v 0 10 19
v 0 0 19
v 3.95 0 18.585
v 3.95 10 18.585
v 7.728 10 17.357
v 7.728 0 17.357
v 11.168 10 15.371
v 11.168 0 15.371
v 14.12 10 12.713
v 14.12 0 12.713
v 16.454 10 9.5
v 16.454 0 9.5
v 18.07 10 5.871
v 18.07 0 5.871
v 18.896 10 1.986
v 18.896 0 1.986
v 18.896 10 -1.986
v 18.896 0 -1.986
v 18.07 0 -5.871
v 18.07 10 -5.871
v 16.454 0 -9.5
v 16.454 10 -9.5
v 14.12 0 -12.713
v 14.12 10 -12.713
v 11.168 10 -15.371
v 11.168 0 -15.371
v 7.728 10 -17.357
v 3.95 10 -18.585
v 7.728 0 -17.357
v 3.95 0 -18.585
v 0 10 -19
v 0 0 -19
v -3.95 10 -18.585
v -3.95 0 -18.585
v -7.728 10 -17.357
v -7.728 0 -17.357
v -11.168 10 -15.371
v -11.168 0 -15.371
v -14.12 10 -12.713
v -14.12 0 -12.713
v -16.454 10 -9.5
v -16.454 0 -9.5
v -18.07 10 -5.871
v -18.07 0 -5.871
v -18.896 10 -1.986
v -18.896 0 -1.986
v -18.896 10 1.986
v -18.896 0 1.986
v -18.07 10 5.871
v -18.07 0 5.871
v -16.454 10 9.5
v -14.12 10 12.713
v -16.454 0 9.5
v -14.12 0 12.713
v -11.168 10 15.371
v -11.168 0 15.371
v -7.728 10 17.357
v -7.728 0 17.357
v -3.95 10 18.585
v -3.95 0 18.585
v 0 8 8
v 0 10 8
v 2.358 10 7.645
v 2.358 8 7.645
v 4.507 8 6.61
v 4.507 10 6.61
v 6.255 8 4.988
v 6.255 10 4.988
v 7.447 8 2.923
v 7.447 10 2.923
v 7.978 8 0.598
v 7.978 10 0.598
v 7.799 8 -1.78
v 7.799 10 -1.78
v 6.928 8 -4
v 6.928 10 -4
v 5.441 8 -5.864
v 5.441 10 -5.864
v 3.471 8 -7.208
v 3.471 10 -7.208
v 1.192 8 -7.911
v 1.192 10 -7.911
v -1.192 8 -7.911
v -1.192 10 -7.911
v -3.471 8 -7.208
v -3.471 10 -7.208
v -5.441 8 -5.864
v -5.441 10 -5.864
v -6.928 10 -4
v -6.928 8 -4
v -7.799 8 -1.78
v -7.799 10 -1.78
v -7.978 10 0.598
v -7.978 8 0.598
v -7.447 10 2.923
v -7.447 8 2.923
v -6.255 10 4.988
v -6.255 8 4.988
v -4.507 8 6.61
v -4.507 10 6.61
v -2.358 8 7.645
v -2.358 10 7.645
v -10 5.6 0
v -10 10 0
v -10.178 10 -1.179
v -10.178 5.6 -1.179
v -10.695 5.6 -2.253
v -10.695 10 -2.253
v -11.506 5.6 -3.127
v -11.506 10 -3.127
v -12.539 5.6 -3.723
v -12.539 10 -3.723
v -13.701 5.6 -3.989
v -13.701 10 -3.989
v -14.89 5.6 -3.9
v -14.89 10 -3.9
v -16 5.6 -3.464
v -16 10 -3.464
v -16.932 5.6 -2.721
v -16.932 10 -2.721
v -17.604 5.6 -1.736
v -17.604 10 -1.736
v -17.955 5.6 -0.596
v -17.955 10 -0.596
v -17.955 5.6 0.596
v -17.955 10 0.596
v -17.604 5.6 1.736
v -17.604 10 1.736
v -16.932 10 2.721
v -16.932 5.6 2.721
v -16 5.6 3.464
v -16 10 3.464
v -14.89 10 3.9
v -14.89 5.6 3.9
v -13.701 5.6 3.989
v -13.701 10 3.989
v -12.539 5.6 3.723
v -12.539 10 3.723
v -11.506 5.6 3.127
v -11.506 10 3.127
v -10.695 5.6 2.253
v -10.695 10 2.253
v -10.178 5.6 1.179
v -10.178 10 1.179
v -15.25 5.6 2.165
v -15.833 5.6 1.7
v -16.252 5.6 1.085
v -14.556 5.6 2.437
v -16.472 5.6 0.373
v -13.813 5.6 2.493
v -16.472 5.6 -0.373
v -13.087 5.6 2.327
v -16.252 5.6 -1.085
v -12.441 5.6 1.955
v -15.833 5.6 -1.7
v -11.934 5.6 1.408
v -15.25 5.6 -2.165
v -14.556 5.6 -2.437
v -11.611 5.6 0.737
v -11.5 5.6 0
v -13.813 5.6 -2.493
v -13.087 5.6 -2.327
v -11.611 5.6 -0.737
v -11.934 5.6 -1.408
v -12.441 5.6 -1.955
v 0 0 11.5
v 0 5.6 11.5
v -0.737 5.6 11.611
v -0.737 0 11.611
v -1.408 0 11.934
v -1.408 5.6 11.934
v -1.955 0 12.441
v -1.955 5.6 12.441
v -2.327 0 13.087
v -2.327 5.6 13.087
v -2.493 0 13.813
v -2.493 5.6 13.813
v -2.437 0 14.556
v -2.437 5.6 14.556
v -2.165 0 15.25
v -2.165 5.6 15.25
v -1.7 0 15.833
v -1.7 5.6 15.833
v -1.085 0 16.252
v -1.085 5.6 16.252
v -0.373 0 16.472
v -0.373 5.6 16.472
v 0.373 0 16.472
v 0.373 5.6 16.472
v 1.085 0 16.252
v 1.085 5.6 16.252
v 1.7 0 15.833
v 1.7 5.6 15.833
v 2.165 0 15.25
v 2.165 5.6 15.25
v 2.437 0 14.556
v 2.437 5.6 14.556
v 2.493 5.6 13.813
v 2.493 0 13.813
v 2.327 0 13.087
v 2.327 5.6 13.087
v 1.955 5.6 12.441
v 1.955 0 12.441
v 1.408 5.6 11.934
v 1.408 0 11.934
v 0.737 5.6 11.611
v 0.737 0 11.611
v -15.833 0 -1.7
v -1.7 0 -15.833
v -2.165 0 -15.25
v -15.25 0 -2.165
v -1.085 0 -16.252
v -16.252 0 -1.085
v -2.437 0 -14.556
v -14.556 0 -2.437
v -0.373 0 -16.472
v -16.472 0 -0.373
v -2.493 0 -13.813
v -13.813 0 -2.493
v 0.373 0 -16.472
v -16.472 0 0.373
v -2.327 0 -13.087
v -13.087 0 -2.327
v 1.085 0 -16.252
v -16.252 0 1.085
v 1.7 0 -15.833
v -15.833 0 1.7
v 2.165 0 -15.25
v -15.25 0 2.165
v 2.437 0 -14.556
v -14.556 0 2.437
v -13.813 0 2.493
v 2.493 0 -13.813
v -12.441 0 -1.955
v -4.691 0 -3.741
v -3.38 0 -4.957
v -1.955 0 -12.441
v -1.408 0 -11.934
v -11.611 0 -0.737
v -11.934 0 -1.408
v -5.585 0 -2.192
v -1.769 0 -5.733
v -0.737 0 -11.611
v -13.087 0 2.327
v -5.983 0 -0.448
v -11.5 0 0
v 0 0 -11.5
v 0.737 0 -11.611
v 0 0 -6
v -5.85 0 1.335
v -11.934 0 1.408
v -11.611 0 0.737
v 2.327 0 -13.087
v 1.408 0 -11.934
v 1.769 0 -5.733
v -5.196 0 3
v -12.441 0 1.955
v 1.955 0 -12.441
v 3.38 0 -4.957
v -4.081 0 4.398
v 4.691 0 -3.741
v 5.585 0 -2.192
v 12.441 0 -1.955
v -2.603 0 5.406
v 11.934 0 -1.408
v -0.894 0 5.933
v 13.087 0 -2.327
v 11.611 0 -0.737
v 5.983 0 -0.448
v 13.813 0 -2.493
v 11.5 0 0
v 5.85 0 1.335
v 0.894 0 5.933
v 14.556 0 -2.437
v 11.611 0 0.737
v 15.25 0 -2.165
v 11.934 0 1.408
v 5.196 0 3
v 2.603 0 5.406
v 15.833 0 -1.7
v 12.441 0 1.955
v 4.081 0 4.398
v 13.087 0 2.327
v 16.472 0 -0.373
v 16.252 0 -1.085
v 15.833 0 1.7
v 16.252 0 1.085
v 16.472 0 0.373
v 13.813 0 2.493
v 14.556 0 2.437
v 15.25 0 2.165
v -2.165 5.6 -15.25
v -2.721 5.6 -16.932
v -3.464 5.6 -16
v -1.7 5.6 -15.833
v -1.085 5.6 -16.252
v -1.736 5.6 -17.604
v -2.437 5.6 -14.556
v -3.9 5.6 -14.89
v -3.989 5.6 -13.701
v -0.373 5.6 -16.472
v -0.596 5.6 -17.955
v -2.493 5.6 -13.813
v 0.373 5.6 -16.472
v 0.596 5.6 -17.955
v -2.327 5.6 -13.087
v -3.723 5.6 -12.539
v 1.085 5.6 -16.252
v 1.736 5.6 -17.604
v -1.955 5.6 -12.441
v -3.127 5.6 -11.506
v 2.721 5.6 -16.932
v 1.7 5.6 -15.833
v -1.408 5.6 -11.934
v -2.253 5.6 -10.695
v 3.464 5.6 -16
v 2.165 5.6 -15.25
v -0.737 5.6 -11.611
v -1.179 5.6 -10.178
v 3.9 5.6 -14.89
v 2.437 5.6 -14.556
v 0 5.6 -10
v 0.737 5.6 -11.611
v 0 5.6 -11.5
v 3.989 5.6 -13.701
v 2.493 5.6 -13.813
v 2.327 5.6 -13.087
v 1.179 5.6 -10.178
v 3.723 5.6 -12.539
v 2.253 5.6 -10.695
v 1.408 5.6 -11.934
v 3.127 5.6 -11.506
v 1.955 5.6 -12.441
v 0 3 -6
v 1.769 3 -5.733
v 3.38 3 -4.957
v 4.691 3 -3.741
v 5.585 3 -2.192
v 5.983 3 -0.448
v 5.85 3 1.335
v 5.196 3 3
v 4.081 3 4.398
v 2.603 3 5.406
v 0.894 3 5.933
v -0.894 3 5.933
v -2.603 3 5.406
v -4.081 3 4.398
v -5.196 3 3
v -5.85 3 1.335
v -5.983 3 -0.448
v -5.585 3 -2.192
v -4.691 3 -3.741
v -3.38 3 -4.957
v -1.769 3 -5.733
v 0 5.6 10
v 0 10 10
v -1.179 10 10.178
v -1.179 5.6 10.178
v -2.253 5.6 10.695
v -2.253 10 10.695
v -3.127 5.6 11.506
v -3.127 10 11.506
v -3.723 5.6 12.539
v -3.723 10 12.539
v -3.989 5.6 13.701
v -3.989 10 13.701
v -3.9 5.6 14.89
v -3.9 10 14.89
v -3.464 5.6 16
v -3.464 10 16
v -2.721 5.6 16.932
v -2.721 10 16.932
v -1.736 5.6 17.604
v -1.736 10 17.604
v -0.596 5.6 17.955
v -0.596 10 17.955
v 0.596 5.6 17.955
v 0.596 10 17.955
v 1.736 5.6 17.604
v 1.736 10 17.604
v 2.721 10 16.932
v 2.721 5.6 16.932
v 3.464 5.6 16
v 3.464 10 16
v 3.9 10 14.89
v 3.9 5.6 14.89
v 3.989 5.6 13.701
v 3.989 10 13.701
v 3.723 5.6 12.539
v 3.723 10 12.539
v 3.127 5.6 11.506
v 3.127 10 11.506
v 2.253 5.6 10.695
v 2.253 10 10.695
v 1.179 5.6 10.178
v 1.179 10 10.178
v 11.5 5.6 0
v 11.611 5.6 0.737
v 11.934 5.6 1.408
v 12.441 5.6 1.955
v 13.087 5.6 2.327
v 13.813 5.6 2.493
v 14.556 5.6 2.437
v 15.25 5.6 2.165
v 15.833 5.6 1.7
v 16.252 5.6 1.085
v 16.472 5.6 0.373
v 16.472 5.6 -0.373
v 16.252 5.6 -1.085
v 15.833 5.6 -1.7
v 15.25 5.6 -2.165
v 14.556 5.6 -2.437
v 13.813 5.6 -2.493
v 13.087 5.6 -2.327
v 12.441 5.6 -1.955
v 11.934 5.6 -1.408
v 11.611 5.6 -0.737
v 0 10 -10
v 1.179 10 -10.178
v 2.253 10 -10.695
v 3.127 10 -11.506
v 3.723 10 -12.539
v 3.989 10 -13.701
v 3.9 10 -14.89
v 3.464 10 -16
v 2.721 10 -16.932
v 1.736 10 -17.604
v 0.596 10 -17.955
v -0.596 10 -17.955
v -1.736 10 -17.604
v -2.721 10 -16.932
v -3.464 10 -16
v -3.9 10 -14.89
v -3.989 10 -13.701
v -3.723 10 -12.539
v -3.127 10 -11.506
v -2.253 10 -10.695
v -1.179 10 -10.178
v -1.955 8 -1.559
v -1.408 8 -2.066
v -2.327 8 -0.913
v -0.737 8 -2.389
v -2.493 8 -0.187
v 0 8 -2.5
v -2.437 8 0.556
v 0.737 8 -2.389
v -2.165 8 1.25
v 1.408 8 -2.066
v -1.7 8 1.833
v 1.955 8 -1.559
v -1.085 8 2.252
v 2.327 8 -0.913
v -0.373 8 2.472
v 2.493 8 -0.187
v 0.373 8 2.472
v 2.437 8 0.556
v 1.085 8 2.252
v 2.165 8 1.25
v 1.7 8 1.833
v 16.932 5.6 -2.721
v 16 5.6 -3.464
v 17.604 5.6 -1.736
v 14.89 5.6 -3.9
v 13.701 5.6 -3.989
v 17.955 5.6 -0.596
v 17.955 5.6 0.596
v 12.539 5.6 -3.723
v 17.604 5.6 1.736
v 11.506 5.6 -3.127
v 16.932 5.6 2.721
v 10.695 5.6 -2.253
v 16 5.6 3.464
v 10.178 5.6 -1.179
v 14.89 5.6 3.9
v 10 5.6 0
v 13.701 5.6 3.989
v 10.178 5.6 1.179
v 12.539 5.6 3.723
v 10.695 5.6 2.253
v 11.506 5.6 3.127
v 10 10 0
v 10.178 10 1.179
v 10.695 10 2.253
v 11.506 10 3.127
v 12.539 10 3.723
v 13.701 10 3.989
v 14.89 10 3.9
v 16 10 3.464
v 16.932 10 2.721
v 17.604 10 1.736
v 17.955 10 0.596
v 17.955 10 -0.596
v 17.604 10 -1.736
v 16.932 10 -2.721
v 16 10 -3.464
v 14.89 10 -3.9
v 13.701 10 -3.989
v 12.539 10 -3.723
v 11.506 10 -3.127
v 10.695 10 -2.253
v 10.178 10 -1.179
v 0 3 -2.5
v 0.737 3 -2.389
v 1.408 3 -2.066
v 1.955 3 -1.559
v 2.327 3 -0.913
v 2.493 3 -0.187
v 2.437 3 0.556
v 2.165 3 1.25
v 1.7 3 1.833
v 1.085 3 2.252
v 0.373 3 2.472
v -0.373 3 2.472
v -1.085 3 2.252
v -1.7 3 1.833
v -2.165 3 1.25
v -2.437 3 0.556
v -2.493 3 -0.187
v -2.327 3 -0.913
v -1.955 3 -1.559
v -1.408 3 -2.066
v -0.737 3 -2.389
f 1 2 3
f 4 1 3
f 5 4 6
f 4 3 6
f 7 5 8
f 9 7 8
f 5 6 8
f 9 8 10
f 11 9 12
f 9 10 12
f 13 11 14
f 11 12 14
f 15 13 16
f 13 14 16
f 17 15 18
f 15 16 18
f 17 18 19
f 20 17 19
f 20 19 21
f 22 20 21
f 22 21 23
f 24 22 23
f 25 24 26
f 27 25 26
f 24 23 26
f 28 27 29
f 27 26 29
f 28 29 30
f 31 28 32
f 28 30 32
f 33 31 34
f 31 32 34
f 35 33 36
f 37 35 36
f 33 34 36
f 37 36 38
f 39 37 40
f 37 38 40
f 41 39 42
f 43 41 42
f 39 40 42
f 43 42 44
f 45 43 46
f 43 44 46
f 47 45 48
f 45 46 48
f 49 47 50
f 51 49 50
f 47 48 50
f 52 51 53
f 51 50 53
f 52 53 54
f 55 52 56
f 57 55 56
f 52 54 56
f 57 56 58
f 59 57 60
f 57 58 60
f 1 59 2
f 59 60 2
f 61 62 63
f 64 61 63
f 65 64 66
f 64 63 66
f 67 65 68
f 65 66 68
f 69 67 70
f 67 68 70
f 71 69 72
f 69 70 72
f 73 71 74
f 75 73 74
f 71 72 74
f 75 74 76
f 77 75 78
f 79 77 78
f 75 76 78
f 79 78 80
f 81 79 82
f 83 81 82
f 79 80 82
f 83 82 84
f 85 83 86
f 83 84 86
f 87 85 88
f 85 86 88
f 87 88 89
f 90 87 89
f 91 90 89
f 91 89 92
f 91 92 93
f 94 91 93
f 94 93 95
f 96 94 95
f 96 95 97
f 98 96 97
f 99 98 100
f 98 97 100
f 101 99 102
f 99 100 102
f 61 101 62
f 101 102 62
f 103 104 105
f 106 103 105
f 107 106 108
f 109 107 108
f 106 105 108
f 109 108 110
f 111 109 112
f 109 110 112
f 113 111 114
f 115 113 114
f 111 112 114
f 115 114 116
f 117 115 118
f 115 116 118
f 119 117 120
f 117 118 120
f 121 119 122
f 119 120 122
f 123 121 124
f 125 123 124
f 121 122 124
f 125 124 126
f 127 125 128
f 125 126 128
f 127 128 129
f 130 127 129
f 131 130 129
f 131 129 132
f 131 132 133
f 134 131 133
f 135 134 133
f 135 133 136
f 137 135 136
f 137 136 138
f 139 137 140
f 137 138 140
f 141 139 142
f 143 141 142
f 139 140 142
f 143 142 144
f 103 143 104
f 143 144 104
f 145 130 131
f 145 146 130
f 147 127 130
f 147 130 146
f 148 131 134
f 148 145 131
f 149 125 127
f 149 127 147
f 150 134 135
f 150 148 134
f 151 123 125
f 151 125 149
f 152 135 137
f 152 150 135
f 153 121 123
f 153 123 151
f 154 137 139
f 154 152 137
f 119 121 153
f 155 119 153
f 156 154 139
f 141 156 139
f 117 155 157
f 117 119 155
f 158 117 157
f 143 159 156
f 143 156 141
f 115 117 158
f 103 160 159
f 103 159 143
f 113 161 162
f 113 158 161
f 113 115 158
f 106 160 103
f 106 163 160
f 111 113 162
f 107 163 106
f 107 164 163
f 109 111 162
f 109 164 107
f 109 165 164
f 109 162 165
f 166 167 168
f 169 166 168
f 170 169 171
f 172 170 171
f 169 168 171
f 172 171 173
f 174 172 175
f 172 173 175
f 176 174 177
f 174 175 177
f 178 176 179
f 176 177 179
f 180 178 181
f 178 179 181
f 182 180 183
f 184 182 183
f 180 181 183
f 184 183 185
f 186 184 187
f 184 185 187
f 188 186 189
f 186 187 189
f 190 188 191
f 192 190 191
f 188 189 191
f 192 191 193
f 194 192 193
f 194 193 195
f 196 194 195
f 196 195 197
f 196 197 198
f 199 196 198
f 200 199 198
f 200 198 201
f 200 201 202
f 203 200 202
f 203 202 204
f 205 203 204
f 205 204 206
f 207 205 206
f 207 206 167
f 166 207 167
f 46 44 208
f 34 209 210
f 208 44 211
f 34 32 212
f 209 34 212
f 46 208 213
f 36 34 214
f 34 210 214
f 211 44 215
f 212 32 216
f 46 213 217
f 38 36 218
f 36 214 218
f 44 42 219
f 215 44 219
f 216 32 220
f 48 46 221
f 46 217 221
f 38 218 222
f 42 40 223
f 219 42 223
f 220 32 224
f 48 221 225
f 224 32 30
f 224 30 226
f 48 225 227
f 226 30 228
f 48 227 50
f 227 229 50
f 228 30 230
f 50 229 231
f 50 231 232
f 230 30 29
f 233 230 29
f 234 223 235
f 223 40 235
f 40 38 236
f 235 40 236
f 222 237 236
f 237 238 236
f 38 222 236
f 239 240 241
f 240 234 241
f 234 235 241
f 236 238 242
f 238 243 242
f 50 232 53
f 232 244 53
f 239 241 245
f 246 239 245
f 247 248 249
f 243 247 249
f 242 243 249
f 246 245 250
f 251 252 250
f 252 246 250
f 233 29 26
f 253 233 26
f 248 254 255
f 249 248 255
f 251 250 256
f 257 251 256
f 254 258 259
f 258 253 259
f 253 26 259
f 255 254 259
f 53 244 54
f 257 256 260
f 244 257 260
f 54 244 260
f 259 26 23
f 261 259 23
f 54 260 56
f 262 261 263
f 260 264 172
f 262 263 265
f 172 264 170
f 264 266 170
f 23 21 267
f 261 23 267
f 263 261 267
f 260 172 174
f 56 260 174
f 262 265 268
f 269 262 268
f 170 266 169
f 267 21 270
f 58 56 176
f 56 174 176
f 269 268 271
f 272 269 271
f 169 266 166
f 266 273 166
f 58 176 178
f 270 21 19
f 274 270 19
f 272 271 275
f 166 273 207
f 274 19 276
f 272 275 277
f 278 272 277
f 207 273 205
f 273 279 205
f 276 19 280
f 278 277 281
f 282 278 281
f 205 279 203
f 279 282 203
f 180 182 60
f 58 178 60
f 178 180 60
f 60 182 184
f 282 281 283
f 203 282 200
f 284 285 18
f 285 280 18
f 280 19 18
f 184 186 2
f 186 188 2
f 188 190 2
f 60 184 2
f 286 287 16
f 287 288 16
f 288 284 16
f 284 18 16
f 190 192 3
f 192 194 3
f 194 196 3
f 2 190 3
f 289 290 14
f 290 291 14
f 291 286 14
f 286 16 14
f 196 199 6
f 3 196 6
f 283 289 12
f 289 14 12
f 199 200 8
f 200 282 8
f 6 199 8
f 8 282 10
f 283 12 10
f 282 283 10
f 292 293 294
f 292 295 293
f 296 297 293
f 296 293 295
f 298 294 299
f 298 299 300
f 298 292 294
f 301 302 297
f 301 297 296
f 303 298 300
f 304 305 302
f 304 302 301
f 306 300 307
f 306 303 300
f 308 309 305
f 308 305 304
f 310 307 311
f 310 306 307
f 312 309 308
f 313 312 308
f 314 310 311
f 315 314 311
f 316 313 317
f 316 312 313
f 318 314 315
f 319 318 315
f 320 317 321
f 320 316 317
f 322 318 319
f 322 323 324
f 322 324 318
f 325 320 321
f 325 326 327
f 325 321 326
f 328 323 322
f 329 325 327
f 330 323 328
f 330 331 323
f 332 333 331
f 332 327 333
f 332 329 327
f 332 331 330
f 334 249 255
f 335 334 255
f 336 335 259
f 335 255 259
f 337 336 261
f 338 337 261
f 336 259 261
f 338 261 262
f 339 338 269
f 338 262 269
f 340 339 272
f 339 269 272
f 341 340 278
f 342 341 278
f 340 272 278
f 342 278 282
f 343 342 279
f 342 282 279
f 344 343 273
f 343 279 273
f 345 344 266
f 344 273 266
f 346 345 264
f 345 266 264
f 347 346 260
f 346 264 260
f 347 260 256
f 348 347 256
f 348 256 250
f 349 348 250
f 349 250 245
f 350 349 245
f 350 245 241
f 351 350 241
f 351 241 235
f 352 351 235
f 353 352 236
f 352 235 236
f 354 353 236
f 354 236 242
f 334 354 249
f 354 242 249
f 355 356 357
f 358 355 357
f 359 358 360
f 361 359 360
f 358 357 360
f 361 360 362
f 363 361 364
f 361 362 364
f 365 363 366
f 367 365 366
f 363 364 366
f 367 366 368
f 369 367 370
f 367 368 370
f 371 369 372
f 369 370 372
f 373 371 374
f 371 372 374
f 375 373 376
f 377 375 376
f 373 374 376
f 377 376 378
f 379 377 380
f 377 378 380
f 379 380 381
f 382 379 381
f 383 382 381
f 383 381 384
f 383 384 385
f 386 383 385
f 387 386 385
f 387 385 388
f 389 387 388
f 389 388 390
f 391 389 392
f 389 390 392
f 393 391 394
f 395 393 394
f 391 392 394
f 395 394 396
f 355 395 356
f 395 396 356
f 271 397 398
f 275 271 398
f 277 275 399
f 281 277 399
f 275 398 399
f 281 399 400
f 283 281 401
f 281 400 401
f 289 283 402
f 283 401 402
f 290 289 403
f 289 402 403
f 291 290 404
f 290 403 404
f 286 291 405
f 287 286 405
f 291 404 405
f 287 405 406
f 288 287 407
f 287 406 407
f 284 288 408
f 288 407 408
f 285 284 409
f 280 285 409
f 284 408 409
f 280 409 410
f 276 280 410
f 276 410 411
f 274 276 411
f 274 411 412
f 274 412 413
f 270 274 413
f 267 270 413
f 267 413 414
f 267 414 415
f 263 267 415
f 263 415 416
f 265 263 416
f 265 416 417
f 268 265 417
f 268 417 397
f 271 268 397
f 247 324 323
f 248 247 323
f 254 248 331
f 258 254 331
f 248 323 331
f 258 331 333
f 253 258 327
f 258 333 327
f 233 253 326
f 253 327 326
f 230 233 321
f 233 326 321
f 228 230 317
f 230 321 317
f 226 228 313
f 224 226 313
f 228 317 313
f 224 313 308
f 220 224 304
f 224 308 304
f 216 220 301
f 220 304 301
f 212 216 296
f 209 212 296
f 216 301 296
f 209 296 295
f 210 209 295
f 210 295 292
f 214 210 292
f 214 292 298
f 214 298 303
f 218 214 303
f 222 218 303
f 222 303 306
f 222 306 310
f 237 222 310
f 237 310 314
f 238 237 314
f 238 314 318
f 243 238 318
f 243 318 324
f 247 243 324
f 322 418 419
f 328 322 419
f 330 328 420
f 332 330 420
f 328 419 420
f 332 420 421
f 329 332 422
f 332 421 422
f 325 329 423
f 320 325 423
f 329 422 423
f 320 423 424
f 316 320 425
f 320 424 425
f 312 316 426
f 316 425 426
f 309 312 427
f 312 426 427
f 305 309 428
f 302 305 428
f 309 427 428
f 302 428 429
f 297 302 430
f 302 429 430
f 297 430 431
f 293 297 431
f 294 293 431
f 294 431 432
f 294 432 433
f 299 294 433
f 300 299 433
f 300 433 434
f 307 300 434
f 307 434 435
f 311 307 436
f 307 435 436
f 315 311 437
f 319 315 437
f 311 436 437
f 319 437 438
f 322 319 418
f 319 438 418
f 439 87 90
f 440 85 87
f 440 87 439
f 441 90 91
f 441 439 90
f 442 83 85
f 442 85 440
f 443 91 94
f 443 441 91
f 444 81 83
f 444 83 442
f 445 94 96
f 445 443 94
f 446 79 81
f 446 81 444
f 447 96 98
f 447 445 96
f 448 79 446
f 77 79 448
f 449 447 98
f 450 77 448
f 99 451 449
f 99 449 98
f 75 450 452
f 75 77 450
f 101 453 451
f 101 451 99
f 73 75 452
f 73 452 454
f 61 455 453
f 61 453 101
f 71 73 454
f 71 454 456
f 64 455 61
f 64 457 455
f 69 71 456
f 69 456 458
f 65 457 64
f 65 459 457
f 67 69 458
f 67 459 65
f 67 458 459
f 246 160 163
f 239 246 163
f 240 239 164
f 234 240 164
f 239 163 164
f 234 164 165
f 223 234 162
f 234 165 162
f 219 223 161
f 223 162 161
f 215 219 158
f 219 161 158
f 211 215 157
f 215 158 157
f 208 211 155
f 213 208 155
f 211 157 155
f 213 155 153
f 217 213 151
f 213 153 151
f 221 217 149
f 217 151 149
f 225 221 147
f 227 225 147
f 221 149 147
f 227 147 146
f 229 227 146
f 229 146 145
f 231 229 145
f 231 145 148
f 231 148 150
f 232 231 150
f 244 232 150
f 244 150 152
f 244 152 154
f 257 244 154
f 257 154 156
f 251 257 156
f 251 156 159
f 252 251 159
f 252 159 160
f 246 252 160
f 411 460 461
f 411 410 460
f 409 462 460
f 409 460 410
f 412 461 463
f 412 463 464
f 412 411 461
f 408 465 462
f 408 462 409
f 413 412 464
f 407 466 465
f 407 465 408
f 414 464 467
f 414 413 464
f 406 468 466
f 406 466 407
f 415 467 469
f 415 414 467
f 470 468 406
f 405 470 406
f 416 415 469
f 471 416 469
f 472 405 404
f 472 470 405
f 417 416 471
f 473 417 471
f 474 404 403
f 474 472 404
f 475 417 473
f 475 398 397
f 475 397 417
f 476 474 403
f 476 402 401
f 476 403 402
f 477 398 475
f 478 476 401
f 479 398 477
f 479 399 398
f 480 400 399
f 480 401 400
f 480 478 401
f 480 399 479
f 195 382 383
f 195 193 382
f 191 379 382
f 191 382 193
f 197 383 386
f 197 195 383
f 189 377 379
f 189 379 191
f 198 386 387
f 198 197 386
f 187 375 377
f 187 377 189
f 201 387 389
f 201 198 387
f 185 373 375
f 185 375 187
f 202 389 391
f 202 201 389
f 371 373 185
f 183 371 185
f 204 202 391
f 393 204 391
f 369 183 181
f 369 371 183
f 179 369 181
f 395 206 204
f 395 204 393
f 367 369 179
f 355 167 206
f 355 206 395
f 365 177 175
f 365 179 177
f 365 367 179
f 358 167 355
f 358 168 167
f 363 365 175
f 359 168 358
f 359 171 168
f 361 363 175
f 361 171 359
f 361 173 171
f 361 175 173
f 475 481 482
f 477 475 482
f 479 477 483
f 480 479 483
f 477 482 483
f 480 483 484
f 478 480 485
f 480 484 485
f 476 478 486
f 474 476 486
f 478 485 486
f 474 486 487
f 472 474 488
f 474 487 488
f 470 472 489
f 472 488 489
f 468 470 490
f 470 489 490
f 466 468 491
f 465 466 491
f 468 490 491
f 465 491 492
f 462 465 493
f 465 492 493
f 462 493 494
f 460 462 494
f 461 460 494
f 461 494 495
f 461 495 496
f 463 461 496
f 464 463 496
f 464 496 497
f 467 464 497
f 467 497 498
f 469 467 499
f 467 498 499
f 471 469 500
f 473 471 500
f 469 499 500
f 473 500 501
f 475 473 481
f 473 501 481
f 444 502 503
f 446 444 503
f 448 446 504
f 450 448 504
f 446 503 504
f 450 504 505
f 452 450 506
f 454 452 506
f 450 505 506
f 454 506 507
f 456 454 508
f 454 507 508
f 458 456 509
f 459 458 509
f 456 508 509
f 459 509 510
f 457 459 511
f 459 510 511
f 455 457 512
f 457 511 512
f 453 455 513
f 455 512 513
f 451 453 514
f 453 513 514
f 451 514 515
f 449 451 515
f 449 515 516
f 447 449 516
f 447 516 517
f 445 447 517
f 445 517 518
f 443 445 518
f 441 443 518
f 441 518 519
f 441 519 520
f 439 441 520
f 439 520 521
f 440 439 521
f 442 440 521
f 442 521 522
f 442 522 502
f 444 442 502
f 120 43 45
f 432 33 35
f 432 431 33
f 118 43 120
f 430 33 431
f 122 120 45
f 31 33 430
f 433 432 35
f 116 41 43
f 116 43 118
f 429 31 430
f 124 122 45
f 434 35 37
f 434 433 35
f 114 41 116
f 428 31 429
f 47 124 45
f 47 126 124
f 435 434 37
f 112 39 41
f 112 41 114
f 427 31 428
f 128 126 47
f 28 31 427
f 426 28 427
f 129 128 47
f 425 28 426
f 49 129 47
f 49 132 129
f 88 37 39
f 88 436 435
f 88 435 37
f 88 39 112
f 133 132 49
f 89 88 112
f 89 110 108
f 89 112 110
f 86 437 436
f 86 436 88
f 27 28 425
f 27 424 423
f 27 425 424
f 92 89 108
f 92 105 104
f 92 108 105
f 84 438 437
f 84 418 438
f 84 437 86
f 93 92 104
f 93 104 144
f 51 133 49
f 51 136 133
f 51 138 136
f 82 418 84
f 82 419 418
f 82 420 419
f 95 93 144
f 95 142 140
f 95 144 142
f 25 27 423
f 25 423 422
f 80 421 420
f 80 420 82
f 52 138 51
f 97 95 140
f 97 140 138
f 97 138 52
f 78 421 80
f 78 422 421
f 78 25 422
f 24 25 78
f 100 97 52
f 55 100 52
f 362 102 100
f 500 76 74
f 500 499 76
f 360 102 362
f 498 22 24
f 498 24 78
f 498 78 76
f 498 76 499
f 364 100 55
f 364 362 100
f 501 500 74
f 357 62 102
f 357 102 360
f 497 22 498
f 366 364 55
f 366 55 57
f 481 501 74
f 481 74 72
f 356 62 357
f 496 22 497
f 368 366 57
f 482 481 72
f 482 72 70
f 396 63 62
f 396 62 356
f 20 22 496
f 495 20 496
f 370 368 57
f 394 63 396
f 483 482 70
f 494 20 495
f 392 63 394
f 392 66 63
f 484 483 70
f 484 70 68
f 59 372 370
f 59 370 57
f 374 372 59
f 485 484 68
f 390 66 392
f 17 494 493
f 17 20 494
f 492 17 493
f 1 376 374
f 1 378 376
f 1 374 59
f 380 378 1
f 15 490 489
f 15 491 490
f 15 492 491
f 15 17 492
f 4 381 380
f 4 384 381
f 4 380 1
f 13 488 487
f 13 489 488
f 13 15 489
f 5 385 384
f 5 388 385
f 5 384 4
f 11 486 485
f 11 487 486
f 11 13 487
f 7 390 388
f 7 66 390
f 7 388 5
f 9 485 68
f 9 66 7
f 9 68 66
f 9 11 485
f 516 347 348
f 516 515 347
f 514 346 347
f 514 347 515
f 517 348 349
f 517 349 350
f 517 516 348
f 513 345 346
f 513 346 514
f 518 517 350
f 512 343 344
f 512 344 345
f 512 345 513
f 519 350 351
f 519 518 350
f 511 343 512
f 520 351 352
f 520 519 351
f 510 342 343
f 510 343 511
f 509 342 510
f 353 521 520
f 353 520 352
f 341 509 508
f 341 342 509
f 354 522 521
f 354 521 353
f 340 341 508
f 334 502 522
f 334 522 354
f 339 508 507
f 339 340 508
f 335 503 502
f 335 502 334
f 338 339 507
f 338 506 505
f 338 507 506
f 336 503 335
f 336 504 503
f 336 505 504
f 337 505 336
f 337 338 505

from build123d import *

# Parameters (mm, degrees)
SKETCH_1_R               = 19
EXTRUDE_1_DEPTH          = 10
SKETCH_2_R               = 8
CUT_EXTRUDE_1_DEPTH      = 2
SKETCH_3_R               = 6
CUT_EXTRUDE_2_DEPTH      = 3
SKETCH_4_R               = 2.5
CUT_EXTRUDE_3_DEPTH      = 16
SKETCH_5_R               = 4
CUT_EXTRUDE_4_DEPTH      = 4.4
SKETCH_6_R               = 2.5
CUT_EXTRUDE_5_DEPTH      = 28.447404249
PATTERN_CIRCULAR_1_COUNT = 4


with BuildPart() as part:
    # 草图1 → 凸台-拉伸1 (new body)
    with BuildSketch(Plane(origin=(0, 0, 0), x_dir=(1, 0, 0), z_dir=(0, 1, 0))):
        with Locations(Location((0, 0, 0), (0, 0, 270))):
            Circle(SKETCH_1_R)
    extrude(amount=EXTRUDE_1_DEPTH)

    # 草图2 → 切除-拉伸1 (cut)
    with BuildSketch(Plane(origin=(0, 10, 0), x_dir=(1, 0, 0), z_dir=(0, 1, 0))):
        with Locations(Location((0, 0, 0), (0, 0, 270))):
            Circle(SKETCH_2_R)
    extrude(amount=-CUT_EXTRUDE_1_DEPTH, mode=Mode.SUBTRACT)

    # 草图3 → 切除-拉伸2 (cut)
    with BuildSketch(Plane.XZ):
        with Locations(Location((0, 0, 0), (0, 0, 270))):
            Circle(SKETCH_3_R)
    extrude(amount=-CUT_EXTRUDE_2_DEPTH, mode=Mode.SUBTRACT)

    # 草图4 → 切除-拉伸3 (cut)
    with BuildSketch(Plane.XZ.offset(-3)):
        with Locations(Location((0, 0, 0), (0, 0, 270))):
            Circle(SKETCH_4_R)
    extrude(amount=-CUT_EXTRUDE_3_DEPTH, mode=Mode.SUBTRACT)

    # 草图5 → 切除-拉伸4 (cut)
    with BuildSketch(Plane(origin=(0, 10, 0), x_dir=(1, 0, 0), z_dir=(0, 1, 0))):
        with Locations(Location((0, 14, 0), (0, 0, 270))):
            Circle(SKETCH_5_R)
    cut_extrude_4 = extrude(amount=-CUT_EXTRUDE_4_DEPTH, mode=Mode.SUBTRACT)

    # 草图6 → 切除-拉伸5 (cut, through all)
    with BuildSketch(Plane(origin=(0, 5.6, 0), x_dir=(1, 0, 0), z_dir=(0, 1, 0))):
        with Locations(Location((0, 14, 0), (0, 0, 270))):
            Circle(SKETCH_6_R)
    cut_extrude_5 = extrude(amount=-CUT_EXTRUDE_5_DEPTH, mode=Mode.SUBTRACT)

    # 阵列(圆周)1: 切除-拉伸4, 切除-拉伸5 ×4 about axis
    pattern_circular_1_axis = Axis((0, 0, 0), (0, 1, 0))
    add([cut_extrude_4.rotate(pattern_circular_1_axis, i * 360 / PATTERN_CIRCULAR_1_COUNT) for i in range(1, PATTERN_CIRCULAR_1_COUNT)], mode=Mode.SUBTRACT)
    add([cut_extrude_5.rotate(pattern_circular_1_axis, i * 360 / PATTERN_CIRCULAR_1_COUNT) for i in range(1, PATTERN_CIRCULAR_1_COUNT)], mode=Mode.SUBTRACT)


solid = part.part
